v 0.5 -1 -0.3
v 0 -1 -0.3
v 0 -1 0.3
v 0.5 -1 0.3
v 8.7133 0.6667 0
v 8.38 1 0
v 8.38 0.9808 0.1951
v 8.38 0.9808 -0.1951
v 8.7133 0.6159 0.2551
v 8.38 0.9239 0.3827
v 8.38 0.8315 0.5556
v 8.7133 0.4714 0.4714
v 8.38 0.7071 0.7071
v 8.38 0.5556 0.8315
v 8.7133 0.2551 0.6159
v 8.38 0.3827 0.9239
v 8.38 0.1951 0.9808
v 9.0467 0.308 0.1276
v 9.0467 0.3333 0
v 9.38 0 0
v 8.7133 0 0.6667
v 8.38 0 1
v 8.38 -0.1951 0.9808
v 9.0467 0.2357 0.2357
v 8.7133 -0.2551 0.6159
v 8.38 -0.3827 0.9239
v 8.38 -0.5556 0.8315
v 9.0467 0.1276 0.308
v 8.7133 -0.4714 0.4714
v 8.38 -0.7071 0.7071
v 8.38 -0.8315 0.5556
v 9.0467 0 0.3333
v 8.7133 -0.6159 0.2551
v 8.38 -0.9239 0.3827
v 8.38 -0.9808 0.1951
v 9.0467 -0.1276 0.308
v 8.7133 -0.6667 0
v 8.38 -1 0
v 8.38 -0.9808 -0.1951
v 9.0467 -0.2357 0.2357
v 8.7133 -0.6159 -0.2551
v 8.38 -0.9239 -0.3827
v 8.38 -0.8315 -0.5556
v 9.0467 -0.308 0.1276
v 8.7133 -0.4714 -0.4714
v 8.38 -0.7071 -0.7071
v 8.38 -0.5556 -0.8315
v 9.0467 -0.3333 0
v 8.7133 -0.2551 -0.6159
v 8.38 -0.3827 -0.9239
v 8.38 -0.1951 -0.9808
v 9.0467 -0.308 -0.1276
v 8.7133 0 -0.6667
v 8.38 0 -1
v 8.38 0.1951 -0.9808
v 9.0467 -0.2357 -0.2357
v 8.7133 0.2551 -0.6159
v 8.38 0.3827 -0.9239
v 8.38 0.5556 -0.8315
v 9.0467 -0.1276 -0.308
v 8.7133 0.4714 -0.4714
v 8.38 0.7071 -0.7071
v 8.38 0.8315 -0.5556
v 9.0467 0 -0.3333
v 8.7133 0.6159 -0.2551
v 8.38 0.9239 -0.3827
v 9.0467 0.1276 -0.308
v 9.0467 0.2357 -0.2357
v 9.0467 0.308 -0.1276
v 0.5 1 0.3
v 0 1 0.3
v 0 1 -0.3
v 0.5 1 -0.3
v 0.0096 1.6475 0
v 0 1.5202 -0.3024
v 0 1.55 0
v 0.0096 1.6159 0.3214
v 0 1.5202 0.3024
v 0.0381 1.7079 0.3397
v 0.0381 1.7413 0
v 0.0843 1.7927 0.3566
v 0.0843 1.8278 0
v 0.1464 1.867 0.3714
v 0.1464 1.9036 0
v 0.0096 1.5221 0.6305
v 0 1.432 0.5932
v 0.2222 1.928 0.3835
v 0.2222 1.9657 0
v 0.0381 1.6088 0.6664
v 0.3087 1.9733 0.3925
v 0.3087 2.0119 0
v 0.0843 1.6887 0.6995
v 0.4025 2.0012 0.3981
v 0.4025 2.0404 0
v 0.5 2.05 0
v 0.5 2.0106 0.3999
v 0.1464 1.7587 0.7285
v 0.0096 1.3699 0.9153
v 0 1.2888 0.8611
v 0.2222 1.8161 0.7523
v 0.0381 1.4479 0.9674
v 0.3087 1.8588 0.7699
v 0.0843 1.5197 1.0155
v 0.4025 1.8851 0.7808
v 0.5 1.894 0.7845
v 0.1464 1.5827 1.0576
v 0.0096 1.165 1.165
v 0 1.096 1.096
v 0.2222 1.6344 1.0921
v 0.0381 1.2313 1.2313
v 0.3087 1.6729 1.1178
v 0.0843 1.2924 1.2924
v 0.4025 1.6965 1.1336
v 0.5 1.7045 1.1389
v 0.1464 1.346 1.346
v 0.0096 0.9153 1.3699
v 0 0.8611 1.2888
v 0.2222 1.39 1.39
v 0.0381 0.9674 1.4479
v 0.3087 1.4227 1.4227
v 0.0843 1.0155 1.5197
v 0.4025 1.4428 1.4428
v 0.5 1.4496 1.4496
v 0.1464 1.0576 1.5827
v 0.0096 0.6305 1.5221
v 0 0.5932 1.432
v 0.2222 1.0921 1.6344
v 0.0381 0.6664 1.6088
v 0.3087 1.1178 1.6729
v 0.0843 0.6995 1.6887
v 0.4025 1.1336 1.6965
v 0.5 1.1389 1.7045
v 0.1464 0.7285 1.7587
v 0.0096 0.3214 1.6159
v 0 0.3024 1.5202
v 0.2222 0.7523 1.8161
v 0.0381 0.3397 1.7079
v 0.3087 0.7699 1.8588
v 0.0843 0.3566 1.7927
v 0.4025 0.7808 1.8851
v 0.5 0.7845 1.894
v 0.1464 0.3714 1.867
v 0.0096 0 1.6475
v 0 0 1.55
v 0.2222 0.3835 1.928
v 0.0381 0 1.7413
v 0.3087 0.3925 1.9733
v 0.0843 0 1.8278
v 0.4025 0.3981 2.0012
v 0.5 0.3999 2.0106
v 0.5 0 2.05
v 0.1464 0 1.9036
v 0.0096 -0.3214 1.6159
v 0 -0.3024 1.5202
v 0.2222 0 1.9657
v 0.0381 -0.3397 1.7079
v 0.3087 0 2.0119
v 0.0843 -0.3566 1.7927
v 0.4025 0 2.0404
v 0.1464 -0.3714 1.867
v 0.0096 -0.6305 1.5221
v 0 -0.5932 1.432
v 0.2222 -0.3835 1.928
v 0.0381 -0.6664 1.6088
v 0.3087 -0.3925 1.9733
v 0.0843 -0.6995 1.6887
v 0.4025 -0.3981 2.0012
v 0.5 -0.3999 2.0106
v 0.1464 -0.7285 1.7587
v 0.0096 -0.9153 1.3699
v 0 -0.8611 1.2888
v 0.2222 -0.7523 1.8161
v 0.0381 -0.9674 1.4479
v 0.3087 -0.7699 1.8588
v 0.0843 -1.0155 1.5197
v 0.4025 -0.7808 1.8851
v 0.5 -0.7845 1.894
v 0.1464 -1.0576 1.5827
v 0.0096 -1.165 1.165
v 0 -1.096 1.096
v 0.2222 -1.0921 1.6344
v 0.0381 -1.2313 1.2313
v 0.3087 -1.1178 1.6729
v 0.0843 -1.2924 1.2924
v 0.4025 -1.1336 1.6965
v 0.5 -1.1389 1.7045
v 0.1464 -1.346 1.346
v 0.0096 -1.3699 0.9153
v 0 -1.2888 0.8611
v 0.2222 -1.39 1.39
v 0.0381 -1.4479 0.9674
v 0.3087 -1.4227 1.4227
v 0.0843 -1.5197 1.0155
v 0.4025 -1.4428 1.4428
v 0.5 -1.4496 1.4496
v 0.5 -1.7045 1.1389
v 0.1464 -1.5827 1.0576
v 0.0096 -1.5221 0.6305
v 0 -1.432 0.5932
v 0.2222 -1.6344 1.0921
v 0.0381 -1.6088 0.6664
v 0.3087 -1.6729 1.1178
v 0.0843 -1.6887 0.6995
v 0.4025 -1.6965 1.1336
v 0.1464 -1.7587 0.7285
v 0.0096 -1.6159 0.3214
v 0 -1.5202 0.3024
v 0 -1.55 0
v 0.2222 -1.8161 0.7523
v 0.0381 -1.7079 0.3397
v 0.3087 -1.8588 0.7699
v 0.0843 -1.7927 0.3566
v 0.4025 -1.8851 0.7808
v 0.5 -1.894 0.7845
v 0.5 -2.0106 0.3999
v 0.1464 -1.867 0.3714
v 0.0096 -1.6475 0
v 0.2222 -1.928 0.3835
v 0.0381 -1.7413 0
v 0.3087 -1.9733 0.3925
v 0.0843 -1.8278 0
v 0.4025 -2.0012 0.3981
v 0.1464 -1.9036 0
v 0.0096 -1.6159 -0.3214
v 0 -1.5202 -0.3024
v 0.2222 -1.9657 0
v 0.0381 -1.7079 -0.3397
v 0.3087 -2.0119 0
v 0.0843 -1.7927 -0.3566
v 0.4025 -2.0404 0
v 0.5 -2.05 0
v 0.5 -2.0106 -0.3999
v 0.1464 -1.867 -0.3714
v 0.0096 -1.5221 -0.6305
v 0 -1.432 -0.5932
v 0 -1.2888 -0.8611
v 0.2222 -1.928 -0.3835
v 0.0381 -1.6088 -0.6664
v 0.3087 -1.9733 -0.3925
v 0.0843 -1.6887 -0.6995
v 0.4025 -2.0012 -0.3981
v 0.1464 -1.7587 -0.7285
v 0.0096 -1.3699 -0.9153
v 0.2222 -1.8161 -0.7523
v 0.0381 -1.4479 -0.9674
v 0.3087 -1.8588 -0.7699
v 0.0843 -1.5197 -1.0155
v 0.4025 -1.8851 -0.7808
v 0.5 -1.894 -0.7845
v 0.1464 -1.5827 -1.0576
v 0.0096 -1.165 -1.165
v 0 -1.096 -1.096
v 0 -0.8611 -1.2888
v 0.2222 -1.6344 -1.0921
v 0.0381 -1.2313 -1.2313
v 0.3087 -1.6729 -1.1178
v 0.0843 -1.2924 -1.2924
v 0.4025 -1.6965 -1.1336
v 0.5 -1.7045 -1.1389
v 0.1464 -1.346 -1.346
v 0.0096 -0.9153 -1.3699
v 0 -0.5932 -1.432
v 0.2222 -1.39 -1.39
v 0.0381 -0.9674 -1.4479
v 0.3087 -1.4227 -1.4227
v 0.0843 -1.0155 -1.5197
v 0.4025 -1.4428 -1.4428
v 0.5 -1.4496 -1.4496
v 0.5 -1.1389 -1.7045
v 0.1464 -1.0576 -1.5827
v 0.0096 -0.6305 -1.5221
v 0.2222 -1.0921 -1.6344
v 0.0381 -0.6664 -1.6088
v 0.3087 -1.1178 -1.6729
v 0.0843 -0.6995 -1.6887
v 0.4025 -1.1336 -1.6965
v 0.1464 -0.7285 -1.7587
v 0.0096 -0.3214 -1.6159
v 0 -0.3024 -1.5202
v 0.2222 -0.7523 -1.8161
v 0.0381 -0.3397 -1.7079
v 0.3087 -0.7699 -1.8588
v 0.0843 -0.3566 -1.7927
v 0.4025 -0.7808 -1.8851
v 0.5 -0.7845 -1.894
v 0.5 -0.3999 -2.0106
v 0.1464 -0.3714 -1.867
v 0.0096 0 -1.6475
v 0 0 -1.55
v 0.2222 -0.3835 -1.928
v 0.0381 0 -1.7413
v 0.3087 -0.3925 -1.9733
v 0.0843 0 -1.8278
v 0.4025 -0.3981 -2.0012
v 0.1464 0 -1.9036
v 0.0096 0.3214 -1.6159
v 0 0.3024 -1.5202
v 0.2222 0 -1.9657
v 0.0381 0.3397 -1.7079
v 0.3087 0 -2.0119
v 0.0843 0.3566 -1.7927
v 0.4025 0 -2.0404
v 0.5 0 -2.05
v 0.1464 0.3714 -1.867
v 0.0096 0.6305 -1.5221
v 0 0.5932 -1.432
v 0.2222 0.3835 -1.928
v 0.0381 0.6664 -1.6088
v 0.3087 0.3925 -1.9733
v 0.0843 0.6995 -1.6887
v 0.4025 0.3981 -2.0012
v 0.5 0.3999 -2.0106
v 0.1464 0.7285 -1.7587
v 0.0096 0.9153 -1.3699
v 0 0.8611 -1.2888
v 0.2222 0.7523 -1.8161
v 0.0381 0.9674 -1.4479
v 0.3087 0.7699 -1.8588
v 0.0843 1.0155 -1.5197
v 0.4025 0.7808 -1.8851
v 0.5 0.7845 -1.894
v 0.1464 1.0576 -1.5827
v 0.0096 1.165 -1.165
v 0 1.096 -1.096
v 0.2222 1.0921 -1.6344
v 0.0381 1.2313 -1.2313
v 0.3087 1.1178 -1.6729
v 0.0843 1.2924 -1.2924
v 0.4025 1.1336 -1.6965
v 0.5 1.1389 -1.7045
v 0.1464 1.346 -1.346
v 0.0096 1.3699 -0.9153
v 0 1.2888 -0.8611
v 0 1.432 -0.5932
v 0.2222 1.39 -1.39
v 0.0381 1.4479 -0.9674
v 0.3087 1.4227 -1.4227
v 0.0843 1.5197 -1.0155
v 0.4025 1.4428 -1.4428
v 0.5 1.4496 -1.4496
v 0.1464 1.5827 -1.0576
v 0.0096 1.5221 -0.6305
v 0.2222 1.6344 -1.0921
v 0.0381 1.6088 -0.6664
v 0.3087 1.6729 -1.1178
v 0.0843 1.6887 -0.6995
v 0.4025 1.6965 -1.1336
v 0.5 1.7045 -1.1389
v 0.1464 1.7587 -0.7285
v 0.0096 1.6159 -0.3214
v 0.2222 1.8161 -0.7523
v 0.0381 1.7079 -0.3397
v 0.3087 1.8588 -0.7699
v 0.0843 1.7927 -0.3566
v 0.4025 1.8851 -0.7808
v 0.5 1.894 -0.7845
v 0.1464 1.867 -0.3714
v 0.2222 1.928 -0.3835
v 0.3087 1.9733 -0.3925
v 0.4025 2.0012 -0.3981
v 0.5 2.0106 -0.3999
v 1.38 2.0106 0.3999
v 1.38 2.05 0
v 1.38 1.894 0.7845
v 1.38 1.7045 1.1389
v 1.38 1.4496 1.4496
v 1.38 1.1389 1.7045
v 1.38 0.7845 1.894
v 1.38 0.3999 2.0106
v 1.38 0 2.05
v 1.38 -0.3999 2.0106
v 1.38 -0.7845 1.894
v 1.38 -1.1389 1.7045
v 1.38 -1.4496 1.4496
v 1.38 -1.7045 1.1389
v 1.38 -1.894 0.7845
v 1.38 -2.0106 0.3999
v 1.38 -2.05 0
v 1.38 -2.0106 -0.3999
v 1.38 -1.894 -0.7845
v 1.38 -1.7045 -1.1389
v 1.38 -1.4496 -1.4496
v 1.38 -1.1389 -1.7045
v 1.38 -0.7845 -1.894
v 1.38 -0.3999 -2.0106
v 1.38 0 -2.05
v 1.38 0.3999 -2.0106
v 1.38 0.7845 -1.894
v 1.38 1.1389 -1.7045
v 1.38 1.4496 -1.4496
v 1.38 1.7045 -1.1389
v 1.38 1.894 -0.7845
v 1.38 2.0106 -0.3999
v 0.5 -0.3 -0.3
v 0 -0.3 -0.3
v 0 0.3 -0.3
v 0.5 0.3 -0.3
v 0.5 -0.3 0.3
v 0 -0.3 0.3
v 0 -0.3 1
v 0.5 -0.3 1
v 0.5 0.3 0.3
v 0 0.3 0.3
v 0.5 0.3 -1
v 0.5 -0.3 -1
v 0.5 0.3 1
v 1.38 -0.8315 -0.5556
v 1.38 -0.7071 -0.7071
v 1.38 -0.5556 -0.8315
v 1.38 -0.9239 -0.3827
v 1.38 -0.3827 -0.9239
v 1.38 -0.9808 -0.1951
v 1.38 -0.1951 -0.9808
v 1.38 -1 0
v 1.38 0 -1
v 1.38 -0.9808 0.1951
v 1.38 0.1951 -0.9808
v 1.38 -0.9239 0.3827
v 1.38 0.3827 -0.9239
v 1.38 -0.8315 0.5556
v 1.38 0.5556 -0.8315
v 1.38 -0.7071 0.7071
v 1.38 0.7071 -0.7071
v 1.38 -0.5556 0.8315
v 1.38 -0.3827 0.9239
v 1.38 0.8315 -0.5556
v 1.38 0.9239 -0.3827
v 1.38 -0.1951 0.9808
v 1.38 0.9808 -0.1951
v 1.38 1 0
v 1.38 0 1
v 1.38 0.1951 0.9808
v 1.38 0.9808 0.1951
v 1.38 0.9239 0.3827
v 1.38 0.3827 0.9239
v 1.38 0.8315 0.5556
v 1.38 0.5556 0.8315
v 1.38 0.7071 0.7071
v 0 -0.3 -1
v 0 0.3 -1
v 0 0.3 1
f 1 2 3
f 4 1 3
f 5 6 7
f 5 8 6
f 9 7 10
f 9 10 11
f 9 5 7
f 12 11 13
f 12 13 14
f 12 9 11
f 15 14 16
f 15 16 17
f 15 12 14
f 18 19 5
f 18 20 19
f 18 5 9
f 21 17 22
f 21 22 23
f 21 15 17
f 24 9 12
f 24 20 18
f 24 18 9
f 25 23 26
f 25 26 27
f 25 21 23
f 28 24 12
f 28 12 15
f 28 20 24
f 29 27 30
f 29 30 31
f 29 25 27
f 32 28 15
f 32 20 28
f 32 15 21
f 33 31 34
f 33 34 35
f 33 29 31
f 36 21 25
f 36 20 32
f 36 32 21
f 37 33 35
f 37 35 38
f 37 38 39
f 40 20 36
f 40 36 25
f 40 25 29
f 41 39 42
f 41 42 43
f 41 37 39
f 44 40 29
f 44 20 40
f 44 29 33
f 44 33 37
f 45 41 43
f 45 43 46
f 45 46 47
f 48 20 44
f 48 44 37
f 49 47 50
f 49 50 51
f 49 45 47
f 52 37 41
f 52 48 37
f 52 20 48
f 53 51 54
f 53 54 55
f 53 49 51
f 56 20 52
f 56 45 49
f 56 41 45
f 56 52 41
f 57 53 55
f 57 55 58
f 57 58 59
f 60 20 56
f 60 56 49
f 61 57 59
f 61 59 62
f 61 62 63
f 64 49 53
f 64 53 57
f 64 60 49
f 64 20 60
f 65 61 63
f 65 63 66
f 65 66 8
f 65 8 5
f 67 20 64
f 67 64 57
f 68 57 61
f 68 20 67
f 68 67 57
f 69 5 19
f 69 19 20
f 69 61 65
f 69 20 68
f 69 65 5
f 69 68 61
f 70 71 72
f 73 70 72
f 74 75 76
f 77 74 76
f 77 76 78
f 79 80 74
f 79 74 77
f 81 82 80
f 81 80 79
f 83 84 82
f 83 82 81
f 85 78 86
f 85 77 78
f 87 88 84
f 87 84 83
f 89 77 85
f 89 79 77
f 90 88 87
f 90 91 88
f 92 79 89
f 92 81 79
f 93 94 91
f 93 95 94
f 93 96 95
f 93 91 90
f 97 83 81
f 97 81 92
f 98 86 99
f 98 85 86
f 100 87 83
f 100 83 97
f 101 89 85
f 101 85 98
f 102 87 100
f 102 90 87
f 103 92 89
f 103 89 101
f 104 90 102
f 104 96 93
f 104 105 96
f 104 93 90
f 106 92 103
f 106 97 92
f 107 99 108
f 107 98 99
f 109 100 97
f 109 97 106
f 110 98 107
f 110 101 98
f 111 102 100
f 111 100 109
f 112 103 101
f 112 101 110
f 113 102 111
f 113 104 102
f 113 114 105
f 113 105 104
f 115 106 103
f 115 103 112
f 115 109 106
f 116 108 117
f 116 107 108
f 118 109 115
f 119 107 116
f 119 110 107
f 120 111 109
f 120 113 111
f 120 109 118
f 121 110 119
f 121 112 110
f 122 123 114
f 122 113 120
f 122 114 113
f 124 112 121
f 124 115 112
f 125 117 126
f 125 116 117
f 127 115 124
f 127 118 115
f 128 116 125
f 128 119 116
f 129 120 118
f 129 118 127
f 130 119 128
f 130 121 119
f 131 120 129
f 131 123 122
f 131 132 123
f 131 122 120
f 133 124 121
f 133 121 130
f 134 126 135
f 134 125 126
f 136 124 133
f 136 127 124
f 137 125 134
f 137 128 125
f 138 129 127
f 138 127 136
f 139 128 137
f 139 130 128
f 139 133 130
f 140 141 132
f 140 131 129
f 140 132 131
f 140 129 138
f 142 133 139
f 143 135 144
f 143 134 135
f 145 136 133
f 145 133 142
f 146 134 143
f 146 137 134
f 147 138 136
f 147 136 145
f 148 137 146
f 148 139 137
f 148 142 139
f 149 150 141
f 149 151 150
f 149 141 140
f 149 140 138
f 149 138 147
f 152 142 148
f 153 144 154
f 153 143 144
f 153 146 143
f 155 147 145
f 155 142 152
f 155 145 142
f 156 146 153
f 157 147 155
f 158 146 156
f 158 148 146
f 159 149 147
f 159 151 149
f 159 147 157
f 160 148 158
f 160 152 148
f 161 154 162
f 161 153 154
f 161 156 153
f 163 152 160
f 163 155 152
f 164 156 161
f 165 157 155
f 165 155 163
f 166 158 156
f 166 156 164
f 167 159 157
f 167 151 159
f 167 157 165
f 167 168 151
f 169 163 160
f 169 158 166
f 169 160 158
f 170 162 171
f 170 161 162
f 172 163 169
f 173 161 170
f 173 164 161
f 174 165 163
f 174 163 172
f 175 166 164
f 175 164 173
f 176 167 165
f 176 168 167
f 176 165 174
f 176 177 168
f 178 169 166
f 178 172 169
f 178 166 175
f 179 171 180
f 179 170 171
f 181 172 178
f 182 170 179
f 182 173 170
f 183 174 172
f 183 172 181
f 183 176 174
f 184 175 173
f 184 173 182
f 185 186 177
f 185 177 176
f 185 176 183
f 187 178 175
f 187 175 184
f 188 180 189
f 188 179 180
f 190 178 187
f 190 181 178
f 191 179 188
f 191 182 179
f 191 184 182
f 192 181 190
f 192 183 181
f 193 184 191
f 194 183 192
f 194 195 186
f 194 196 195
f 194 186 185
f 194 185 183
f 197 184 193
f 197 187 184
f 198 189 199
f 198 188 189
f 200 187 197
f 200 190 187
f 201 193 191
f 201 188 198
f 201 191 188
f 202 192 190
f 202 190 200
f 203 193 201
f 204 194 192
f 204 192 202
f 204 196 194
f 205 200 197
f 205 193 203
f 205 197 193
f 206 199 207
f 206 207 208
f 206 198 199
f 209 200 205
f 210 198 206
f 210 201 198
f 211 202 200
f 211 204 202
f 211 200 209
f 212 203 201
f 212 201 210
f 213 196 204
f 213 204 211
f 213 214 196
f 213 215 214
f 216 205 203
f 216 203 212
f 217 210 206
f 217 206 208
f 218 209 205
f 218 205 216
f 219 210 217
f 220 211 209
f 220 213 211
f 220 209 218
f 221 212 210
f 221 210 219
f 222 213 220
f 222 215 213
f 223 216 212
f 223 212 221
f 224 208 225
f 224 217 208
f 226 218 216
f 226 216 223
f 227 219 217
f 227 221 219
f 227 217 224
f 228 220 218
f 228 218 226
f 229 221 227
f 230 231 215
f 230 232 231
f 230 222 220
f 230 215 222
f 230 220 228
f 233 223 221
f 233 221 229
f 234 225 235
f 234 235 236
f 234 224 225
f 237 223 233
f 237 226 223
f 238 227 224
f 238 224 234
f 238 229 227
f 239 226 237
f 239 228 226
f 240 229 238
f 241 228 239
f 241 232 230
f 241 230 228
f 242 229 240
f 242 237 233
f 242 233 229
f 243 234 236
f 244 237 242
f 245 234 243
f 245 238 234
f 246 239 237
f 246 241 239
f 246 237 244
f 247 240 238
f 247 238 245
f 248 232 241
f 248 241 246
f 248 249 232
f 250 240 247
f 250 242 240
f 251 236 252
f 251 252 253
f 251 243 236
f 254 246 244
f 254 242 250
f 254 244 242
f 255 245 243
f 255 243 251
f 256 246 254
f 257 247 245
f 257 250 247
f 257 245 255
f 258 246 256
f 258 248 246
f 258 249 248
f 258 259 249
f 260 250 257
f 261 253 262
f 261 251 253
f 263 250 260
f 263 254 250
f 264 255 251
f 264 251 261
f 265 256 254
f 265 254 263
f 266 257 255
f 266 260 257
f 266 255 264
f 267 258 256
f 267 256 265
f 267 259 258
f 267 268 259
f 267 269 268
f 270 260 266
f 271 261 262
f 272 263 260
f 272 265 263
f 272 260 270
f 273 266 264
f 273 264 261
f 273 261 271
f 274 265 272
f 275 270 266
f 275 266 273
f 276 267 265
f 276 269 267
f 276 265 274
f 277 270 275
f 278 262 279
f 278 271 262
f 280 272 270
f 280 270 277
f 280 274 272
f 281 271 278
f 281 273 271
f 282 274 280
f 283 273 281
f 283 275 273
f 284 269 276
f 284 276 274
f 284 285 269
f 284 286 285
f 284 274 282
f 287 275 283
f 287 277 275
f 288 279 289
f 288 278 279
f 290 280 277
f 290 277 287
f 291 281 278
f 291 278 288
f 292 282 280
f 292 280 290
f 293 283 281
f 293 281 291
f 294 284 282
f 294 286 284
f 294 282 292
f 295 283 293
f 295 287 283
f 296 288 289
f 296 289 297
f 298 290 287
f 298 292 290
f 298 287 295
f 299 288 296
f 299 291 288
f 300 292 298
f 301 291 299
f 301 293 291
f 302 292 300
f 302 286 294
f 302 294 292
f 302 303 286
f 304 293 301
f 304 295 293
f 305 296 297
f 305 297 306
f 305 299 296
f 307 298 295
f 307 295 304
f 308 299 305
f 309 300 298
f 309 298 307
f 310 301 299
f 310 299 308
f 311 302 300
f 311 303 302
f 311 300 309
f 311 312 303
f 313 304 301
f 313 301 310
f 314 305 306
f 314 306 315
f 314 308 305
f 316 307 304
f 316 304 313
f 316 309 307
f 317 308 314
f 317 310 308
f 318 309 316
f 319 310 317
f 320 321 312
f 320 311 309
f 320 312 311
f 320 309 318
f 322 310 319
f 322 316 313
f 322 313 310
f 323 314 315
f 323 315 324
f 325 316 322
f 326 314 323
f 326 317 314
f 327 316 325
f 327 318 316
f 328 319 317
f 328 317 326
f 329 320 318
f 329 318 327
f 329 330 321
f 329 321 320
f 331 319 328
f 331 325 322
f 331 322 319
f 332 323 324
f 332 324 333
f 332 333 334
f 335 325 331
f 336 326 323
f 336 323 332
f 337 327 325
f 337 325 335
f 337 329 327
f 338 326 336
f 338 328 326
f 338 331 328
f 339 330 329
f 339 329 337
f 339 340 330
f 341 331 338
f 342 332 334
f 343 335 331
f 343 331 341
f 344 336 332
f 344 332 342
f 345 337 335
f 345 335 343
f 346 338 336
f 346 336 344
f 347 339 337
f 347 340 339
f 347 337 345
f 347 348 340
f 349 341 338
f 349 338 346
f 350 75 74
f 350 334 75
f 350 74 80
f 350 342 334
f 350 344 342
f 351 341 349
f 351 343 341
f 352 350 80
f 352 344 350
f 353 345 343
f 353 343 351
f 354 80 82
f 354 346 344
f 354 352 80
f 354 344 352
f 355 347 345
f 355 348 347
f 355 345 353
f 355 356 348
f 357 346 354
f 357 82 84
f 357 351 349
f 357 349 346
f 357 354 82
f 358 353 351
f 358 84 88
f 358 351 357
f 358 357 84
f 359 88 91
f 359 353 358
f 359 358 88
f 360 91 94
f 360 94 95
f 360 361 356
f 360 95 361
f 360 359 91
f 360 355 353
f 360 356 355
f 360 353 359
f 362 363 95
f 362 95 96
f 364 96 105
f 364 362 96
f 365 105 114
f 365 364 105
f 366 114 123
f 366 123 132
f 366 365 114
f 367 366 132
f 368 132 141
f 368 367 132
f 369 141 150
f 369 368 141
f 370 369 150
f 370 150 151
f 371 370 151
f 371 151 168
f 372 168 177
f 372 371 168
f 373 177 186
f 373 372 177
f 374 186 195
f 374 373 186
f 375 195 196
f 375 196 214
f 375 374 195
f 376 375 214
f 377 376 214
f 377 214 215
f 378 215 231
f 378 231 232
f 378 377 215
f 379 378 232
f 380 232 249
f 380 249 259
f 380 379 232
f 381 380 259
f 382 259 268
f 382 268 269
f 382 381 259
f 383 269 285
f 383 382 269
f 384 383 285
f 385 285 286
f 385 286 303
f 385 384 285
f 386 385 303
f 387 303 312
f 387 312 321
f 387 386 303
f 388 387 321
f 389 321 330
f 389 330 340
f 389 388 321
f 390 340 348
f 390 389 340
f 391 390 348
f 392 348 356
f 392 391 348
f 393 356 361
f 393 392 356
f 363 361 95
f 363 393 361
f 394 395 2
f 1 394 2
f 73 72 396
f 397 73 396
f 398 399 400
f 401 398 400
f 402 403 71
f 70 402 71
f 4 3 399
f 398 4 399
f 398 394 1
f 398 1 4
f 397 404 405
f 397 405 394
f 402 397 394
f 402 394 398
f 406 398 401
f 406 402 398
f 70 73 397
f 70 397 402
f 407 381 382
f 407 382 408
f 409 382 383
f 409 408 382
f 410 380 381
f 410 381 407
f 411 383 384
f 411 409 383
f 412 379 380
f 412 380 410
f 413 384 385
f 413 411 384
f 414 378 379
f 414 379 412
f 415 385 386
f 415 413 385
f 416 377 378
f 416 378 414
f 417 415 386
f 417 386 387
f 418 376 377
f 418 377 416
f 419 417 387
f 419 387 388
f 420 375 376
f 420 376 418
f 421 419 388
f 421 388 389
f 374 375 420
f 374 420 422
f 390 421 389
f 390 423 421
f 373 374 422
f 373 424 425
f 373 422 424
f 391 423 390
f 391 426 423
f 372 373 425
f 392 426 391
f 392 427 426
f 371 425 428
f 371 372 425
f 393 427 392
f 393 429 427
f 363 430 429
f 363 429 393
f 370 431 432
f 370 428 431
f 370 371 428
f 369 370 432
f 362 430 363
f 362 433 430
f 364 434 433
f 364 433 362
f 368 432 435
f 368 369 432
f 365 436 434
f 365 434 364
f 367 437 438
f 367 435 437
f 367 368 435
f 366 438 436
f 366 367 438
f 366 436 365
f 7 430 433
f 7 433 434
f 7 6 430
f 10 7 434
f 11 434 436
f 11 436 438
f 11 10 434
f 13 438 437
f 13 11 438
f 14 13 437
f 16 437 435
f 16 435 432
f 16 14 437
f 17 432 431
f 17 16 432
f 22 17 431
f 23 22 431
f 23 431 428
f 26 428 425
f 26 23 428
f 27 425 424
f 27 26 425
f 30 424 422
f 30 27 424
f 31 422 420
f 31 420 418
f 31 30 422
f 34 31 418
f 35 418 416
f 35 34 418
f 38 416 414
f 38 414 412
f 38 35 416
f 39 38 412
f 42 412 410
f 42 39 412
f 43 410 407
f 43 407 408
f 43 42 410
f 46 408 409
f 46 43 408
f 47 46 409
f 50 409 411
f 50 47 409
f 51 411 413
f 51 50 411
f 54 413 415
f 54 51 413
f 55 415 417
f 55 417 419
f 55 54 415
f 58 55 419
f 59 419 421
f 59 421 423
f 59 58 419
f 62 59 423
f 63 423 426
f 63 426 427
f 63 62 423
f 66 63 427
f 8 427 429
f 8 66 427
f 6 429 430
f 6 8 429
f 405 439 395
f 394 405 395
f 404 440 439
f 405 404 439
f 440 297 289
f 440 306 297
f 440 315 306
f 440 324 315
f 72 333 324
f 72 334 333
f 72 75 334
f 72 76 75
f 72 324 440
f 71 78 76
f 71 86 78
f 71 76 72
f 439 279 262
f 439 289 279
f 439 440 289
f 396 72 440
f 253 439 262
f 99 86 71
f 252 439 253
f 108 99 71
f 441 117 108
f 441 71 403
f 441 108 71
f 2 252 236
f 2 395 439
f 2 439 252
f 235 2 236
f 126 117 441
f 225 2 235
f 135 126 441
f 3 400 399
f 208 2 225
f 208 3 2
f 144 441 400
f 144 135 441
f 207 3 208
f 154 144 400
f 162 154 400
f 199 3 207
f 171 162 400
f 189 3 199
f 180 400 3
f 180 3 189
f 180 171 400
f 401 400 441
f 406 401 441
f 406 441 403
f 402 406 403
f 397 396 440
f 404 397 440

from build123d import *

# Parameters (mm, degrees)
CUT_EXTRUDE_1_DEPTH = 0.5
FILLET_1_R          = 0.5


with BuildPart() as part:
    # 草图1 → 旋转1 (revolve)
    with BuildSketch(Plane.XY):
        Polygon((0, 0), (0, 2.05), (1.38, 2.05), (1.38, 1), (8.38, 1), (9.38, 0), align=None)
    revolve(axis=Axis((-6.976540153, 0, 0), (1, 0, 0)))

    # 草图2 → 切除-拉伸1 (cut)
    with BuildSketch(Plane.ZY):
        Polygon((-0.3, 0.3), (-1, 0.3), (-1, -0.3), (-0.3, -0.3), (-0.3, -1), (0.3, -1), (0.3, -0.3), (1, -0.3), (1, 0.3), (0.3, 0.3), (0.3, 1), (-0.3, 1), align=None)
    extrude(amount=-CUT_EXTRUDE_1_DEPTH, mode=Mode.SUBTRACT)

    # 圆角1
    fillet_1_edges = [part.edges().sort_by_distance(p)[0] for p in [
        (0, -2.05, 0),
    ]]
    fillet(fillet_1_edges, radius=FILLET_1_R)


solid = part.part
